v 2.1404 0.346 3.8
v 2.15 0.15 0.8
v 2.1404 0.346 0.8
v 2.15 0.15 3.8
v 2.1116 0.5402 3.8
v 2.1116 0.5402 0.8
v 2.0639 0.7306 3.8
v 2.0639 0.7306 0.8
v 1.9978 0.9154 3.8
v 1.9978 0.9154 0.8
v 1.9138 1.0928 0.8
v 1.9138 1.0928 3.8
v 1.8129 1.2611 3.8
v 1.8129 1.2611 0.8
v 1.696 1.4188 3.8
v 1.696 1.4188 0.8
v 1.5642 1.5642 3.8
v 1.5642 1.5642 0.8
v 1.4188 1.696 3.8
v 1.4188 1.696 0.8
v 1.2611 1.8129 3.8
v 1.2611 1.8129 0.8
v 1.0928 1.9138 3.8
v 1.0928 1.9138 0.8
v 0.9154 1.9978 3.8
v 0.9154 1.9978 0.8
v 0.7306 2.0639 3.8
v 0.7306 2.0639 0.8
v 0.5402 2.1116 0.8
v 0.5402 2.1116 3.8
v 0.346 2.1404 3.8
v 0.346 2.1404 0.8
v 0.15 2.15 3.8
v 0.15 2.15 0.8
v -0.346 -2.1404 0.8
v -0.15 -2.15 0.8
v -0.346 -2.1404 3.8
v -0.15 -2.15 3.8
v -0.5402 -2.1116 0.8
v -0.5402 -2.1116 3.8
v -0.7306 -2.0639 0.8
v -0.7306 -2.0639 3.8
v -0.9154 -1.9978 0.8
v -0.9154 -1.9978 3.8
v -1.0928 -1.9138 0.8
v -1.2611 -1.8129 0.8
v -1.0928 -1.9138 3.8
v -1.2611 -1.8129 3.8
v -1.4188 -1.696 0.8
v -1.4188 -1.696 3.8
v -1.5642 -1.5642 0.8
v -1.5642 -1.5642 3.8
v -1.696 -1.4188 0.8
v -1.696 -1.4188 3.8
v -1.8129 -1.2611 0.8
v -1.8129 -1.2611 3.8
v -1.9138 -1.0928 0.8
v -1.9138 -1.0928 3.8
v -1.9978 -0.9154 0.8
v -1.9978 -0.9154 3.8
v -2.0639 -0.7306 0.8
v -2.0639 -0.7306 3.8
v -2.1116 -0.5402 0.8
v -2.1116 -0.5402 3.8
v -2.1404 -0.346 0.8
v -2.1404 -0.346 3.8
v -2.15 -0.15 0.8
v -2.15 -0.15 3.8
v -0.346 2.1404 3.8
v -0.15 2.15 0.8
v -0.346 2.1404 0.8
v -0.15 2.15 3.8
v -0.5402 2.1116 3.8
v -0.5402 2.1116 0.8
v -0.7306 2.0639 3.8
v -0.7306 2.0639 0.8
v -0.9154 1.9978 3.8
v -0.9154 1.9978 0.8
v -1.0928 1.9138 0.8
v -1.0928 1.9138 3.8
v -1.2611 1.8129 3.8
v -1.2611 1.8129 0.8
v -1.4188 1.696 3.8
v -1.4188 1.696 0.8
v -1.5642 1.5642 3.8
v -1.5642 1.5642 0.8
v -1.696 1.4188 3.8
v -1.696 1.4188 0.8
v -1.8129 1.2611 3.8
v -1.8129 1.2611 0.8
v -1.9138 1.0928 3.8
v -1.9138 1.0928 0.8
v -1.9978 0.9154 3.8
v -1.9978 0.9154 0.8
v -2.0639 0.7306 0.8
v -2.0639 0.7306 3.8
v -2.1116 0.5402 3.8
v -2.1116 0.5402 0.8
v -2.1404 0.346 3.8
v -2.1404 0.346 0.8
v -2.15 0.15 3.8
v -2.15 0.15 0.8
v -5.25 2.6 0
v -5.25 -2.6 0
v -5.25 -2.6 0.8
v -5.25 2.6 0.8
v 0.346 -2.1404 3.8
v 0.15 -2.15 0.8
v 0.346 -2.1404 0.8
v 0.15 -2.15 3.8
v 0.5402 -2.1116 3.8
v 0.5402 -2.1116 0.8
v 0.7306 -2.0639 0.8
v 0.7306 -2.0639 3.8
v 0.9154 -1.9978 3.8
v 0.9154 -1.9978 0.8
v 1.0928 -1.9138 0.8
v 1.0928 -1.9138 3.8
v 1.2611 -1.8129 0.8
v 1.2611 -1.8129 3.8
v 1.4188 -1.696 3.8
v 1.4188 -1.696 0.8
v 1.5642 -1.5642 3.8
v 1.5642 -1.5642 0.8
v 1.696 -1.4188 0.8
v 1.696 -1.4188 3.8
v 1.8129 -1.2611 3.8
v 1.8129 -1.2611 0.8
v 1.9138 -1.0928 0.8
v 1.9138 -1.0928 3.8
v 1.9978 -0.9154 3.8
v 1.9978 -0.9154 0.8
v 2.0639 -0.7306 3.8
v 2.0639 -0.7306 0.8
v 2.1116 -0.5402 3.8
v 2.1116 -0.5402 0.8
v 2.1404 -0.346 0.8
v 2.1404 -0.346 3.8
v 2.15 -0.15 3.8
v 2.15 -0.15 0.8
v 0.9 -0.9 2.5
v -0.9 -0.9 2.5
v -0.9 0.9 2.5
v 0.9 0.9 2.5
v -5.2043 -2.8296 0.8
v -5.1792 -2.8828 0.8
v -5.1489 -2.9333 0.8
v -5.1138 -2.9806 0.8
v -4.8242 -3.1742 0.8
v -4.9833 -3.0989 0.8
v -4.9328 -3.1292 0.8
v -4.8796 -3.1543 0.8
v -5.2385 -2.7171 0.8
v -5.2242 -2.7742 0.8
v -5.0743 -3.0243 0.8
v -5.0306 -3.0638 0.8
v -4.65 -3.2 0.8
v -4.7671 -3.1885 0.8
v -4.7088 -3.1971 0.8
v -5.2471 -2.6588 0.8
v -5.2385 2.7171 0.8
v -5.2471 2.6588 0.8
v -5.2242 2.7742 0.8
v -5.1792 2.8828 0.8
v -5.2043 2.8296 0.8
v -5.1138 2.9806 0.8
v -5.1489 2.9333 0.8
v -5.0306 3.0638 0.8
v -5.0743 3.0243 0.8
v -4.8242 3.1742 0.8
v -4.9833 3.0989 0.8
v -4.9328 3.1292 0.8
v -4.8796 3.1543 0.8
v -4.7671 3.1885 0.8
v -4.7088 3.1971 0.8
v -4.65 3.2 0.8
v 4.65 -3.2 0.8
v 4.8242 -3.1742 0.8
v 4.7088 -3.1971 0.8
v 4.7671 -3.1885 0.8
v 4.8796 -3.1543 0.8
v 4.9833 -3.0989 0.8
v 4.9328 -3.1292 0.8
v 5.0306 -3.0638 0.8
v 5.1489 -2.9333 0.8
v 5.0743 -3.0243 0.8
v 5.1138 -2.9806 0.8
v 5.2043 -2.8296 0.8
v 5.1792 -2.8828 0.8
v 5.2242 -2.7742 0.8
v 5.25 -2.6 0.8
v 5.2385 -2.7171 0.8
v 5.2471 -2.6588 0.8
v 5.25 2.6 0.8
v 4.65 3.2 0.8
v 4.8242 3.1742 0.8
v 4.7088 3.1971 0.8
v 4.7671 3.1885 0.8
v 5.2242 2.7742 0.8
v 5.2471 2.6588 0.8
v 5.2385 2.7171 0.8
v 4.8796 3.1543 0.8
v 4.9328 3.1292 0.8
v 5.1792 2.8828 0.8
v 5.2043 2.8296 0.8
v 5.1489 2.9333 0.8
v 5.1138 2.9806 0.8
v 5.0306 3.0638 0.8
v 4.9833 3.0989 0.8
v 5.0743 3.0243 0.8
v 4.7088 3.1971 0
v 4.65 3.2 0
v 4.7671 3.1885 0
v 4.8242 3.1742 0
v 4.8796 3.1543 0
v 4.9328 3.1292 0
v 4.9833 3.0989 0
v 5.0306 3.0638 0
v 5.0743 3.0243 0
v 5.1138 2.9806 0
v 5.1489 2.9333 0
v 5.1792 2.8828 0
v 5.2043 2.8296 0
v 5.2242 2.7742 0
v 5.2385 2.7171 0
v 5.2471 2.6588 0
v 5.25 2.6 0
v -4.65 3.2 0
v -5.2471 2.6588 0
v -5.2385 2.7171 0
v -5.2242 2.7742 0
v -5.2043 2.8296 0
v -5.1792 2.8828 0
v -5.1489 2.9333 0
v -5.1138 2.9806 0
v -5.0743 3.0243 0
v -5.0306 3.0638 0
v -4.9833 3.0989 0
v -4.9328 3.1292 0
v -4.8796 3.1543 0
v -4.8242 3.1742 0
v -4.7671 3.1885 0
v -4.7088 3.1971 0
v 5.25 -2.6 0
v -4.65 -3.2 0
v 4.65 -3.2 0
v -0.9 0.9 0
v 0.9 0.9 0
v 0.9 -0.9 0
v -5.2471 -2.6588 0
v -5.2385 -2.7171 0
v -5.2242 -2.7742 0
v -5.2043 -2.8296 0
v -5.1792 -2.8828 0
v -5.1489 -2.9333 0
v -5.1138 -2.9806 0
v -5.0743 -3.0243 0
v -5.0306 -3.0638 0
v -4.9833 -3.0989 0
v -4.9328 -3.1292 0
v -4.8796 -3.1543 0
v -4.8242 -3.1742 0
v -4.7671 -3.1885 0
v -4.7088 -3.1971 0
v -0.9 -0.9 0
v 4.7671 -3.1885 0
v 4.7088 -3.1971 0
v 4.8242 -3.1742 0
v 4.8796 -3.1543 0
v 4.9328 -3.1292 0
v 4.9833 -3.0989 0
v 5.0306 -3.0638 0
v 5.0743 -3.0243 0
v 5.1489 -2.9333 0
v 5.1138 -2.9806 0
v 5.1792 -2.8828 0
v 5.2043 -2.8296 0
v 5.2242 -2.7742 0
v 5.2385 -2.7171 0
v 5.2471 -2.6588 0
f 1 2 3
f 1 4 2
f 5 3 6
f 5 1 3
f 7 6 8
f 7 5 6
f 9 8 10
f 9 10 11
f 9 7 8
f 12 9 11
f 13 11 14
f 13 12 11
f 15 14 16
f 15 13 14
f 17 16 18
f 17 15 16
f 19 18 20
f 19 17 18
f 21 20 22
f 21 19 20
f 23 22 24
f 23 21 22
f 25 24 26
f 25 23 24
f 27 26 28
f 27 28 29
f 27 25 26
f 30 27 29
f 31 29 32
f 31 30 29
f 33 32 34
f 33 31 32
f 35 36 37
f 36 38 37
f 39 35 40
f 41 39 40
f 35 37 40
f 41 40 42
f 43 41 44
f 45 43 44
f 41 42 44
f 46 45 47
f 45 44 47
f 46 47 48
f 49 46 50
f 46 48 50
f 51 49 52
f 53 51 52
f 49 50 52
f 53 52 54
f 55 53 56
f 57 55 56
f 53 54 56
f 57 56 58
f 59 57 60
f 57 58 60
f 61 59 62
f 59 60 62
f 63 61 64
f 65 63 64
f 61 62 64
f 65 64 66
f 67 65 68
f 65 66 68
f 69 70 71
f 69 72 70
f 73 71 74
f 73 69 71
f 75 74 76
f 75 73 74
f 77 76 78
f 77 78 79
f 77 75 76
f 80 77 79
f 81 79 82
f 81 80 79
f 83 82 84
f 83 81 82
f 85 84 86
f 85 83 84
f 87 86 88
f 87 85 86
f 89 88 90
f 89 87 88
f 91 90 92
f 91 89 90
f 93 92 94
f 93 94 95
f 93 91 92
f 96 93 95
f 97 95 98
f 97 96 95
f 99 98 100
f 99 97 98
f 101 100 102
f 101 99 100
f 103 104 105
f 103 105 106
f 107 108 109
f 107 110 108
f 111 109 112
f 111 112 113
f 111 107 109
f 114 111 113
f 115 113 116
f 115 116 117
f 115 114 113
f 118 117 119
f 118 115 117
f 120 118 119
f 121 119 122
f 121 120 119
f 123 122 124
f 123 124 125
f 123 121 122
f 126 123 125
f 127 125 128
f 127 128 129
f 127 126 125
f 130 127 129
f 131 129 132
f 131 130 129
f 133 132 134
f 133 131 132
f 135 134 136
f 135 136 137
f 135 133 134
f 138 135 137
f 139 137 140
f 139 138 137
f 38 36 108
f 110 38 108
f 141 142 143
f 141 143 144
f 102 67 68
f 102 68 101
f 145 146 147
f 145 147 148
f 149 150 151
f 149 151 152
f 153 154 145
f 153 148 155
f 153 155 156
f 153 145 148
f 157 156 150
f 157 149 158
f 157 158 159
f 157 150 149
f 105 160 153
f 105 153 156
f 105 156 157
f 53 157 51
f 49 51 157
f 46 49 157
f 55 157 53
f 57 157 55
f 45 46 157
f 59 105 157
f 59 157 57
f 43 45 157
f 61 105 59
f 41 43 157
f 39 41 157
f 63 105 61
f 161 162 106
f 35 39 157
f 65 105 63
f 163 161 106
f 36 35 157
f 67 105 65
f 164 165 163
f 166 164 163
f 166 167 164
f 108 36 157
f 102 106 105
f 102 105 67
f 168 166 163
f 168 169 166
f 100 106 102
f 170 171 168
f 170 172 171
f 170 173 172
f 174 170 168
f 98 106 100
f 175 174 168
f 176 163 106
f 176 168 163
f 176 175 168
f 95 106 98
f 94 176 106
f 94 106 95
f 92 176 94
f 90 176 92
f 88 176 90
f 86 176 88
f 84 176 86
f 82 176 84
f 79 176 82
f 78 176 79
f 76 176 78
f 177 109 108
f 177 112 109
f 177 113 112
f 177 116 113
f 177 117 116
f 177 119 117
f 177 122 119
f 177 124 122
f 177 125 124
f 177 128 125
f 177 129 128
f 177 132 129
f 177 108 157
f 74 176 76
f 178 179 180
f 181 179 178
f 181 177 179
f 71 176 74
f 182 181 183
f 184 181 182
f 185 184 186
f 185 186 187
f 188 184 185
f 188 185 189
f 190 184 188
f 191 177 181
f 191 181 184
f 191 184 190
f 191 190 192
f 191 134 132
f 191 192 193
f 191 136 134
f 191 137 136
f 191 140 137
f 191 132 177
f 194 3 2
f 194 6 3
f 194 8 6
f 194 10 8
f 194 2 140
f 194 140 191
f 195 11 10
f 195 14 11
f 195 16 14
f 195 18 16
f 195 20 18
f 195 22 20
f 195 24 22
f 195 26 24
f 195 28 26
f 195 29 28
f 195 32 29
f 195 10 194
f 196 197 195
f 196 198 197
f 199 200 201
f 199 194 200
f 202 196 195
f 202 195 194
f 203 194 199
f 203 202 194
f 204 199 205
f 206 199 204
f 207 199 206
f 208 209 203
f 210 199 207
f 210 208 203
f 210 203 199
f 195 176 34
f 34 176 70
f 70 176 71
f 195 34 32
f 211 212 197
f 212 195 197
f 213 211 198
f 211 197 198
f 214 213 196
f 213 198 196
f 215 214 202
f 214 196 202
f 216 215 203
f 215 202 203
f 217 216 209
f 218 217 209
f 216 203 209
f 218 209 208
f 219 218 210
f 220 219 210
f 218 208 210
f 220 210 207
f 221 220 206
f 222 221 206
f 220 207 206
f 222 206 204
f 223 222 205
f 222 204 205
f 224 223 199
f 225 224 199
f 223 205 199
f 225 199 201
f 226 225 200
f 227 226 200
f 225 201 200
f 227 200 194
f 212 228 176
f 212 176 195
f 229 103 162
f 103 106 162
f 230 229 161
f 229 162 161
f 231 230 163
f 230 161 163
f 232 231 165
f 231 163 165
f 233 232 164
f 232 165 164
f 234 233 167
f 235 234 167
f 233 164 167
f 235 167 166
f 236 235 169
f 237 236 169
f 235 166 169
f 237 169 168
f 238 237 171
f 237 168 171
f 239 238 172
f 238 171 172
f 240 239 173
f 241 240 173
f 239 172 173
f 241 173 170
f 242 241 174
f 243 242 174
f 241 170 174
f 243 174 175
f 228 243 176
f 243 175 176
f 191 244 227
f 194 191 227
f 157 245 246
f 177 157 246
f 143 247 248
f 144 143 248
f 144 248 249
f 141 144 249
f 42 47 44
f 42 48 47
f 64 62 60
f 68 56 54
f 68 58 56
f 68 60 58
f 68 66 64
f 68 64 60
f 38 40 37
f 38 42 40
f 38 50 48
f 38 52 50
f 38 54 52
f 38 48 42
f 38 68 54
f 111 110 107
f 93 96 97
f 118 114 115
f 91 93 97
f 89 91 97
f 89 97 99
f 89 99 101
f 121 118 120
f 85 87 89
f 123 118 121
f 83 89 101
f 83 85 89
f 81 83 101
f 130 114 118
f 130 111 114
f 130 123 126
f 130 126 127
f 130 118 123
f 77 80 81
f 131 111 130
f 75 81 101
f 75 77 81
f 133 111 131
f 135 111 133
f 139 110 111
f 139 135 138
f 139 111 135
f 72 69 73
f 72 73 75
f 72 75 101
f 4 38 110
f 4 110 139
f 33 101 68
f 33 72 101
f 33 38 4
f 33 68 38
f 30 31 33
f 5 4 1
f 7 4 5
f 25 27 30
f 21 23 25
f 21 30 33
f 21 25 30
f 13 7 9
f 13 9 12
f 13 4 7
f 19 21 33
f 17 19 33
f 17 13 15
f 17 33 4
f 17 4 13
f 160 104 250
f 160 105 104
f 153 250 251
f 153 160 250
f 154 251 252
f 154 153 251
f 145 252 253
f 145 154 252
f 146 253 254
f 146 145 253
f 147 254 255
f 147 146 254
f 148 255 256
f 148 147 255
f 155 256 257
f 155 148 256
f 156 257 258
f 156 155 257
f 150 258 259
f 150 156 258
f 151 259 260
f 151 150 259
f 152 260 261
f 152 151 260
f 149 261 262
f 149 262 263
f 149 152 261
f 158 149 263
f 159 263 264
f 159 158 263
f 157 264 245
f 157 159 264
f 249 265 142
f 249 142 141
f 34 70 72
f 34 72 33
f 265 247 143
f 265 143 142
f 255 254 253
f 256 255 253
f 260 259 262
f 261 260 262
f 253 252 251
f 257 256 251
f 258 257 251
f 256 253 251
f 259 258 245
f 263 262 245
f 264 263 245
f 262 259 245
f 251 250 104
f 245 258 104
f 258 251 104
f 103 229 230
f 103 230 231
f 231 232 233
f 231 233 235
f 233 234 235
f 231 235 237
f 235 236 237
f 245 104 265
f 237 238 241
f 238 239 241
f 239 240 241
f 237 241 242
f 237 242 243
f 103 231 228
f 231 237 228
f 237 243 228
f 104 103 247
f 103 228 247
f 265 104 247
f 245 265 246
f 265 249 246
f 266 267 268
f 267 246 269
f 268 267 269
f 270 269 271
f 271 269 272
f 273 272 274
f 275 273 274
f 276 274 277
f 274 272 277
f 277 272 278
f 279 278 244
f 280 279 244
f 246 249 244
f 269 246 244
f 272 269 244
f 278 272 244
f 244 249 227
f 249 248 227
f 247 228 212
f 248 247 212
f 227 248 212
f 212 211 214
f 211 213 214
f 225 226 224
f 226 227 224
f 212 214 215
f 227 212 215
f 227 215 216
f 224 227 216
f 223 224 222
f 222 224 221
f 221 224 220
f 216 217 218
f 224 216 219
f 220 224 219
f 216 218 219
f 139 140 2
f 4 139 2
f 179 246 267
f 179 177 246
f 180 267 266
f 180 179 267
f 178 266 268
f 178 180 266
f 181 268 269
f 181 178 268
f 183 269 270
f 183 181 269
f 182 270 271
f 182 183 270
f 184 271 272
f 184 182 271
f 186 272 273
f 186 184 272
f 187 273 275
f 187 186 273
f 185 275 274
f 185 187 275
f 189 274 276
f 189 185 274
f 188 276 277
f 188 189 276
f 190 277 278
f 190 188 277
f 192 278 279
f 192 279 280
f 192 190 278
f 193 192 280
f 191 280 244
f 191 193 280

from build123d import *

# Parameters (mm, degrees)
F0_W     = 10.5
F0_H     = 6.4
F1_DEPTH = 0.8
F2_W     = 4.3
F2_H     = 4.3
F3_DEPTH = 3
F4_R     = 2
F5_R     = 0.6
F6_W     = 1.8
F6_H     = 1.8
F7_DEPTH = 2.5


with BuildPart() as f1:
    # F0 (on Top) → F1 (new body)
    with BuildSketch(Plane.XY):
        Rectangle(F0_W, F0_H)
    extrude(amount=F1_DEPTH)

    # F2 (on face) → F3 (join)
    with BuildSketch(Plane.XY.offset(0.8)):
        Rectangle(F2_W, F2_H)
    extrude(amount=F3_DEPTH)

    # F4
    f4_edges = [f1.edges().sort_by_distance(p)[0] for p in [
        (-2.15, -2.15, 2.3),
        (-2.15, 2.15, 2.3),
        (2.15, -2.15, 2.3),
        (2.15, 2.15, 2.3),
    ]]
    fillet(f4_edges, radius=F4_R)

    # F5
    f5_edges = [f1.edges().sort_by_distance(p)[0] for p in [
        (-5.25, -3.2, 0.4),
        (-5.25, 3.2, 0.4),
        (5.25, -3.2, 0.4),
        (5.25, 3.2, 0.4),
    ]]
    fillet(f5_edges, radius=F5_R)

    # F6 (on face) → F7 (cut)
    with BuildSketch(Plane(origin=(0, 0, 0), x_dir=(1, 0, 0), z_dir=(0, 0, -1))):
        Rectangle(F6_W, F6_H)
    extrude(amount=-F7_DEPTH, mode=Mode.SUBTRACT)


solid = f1.part
